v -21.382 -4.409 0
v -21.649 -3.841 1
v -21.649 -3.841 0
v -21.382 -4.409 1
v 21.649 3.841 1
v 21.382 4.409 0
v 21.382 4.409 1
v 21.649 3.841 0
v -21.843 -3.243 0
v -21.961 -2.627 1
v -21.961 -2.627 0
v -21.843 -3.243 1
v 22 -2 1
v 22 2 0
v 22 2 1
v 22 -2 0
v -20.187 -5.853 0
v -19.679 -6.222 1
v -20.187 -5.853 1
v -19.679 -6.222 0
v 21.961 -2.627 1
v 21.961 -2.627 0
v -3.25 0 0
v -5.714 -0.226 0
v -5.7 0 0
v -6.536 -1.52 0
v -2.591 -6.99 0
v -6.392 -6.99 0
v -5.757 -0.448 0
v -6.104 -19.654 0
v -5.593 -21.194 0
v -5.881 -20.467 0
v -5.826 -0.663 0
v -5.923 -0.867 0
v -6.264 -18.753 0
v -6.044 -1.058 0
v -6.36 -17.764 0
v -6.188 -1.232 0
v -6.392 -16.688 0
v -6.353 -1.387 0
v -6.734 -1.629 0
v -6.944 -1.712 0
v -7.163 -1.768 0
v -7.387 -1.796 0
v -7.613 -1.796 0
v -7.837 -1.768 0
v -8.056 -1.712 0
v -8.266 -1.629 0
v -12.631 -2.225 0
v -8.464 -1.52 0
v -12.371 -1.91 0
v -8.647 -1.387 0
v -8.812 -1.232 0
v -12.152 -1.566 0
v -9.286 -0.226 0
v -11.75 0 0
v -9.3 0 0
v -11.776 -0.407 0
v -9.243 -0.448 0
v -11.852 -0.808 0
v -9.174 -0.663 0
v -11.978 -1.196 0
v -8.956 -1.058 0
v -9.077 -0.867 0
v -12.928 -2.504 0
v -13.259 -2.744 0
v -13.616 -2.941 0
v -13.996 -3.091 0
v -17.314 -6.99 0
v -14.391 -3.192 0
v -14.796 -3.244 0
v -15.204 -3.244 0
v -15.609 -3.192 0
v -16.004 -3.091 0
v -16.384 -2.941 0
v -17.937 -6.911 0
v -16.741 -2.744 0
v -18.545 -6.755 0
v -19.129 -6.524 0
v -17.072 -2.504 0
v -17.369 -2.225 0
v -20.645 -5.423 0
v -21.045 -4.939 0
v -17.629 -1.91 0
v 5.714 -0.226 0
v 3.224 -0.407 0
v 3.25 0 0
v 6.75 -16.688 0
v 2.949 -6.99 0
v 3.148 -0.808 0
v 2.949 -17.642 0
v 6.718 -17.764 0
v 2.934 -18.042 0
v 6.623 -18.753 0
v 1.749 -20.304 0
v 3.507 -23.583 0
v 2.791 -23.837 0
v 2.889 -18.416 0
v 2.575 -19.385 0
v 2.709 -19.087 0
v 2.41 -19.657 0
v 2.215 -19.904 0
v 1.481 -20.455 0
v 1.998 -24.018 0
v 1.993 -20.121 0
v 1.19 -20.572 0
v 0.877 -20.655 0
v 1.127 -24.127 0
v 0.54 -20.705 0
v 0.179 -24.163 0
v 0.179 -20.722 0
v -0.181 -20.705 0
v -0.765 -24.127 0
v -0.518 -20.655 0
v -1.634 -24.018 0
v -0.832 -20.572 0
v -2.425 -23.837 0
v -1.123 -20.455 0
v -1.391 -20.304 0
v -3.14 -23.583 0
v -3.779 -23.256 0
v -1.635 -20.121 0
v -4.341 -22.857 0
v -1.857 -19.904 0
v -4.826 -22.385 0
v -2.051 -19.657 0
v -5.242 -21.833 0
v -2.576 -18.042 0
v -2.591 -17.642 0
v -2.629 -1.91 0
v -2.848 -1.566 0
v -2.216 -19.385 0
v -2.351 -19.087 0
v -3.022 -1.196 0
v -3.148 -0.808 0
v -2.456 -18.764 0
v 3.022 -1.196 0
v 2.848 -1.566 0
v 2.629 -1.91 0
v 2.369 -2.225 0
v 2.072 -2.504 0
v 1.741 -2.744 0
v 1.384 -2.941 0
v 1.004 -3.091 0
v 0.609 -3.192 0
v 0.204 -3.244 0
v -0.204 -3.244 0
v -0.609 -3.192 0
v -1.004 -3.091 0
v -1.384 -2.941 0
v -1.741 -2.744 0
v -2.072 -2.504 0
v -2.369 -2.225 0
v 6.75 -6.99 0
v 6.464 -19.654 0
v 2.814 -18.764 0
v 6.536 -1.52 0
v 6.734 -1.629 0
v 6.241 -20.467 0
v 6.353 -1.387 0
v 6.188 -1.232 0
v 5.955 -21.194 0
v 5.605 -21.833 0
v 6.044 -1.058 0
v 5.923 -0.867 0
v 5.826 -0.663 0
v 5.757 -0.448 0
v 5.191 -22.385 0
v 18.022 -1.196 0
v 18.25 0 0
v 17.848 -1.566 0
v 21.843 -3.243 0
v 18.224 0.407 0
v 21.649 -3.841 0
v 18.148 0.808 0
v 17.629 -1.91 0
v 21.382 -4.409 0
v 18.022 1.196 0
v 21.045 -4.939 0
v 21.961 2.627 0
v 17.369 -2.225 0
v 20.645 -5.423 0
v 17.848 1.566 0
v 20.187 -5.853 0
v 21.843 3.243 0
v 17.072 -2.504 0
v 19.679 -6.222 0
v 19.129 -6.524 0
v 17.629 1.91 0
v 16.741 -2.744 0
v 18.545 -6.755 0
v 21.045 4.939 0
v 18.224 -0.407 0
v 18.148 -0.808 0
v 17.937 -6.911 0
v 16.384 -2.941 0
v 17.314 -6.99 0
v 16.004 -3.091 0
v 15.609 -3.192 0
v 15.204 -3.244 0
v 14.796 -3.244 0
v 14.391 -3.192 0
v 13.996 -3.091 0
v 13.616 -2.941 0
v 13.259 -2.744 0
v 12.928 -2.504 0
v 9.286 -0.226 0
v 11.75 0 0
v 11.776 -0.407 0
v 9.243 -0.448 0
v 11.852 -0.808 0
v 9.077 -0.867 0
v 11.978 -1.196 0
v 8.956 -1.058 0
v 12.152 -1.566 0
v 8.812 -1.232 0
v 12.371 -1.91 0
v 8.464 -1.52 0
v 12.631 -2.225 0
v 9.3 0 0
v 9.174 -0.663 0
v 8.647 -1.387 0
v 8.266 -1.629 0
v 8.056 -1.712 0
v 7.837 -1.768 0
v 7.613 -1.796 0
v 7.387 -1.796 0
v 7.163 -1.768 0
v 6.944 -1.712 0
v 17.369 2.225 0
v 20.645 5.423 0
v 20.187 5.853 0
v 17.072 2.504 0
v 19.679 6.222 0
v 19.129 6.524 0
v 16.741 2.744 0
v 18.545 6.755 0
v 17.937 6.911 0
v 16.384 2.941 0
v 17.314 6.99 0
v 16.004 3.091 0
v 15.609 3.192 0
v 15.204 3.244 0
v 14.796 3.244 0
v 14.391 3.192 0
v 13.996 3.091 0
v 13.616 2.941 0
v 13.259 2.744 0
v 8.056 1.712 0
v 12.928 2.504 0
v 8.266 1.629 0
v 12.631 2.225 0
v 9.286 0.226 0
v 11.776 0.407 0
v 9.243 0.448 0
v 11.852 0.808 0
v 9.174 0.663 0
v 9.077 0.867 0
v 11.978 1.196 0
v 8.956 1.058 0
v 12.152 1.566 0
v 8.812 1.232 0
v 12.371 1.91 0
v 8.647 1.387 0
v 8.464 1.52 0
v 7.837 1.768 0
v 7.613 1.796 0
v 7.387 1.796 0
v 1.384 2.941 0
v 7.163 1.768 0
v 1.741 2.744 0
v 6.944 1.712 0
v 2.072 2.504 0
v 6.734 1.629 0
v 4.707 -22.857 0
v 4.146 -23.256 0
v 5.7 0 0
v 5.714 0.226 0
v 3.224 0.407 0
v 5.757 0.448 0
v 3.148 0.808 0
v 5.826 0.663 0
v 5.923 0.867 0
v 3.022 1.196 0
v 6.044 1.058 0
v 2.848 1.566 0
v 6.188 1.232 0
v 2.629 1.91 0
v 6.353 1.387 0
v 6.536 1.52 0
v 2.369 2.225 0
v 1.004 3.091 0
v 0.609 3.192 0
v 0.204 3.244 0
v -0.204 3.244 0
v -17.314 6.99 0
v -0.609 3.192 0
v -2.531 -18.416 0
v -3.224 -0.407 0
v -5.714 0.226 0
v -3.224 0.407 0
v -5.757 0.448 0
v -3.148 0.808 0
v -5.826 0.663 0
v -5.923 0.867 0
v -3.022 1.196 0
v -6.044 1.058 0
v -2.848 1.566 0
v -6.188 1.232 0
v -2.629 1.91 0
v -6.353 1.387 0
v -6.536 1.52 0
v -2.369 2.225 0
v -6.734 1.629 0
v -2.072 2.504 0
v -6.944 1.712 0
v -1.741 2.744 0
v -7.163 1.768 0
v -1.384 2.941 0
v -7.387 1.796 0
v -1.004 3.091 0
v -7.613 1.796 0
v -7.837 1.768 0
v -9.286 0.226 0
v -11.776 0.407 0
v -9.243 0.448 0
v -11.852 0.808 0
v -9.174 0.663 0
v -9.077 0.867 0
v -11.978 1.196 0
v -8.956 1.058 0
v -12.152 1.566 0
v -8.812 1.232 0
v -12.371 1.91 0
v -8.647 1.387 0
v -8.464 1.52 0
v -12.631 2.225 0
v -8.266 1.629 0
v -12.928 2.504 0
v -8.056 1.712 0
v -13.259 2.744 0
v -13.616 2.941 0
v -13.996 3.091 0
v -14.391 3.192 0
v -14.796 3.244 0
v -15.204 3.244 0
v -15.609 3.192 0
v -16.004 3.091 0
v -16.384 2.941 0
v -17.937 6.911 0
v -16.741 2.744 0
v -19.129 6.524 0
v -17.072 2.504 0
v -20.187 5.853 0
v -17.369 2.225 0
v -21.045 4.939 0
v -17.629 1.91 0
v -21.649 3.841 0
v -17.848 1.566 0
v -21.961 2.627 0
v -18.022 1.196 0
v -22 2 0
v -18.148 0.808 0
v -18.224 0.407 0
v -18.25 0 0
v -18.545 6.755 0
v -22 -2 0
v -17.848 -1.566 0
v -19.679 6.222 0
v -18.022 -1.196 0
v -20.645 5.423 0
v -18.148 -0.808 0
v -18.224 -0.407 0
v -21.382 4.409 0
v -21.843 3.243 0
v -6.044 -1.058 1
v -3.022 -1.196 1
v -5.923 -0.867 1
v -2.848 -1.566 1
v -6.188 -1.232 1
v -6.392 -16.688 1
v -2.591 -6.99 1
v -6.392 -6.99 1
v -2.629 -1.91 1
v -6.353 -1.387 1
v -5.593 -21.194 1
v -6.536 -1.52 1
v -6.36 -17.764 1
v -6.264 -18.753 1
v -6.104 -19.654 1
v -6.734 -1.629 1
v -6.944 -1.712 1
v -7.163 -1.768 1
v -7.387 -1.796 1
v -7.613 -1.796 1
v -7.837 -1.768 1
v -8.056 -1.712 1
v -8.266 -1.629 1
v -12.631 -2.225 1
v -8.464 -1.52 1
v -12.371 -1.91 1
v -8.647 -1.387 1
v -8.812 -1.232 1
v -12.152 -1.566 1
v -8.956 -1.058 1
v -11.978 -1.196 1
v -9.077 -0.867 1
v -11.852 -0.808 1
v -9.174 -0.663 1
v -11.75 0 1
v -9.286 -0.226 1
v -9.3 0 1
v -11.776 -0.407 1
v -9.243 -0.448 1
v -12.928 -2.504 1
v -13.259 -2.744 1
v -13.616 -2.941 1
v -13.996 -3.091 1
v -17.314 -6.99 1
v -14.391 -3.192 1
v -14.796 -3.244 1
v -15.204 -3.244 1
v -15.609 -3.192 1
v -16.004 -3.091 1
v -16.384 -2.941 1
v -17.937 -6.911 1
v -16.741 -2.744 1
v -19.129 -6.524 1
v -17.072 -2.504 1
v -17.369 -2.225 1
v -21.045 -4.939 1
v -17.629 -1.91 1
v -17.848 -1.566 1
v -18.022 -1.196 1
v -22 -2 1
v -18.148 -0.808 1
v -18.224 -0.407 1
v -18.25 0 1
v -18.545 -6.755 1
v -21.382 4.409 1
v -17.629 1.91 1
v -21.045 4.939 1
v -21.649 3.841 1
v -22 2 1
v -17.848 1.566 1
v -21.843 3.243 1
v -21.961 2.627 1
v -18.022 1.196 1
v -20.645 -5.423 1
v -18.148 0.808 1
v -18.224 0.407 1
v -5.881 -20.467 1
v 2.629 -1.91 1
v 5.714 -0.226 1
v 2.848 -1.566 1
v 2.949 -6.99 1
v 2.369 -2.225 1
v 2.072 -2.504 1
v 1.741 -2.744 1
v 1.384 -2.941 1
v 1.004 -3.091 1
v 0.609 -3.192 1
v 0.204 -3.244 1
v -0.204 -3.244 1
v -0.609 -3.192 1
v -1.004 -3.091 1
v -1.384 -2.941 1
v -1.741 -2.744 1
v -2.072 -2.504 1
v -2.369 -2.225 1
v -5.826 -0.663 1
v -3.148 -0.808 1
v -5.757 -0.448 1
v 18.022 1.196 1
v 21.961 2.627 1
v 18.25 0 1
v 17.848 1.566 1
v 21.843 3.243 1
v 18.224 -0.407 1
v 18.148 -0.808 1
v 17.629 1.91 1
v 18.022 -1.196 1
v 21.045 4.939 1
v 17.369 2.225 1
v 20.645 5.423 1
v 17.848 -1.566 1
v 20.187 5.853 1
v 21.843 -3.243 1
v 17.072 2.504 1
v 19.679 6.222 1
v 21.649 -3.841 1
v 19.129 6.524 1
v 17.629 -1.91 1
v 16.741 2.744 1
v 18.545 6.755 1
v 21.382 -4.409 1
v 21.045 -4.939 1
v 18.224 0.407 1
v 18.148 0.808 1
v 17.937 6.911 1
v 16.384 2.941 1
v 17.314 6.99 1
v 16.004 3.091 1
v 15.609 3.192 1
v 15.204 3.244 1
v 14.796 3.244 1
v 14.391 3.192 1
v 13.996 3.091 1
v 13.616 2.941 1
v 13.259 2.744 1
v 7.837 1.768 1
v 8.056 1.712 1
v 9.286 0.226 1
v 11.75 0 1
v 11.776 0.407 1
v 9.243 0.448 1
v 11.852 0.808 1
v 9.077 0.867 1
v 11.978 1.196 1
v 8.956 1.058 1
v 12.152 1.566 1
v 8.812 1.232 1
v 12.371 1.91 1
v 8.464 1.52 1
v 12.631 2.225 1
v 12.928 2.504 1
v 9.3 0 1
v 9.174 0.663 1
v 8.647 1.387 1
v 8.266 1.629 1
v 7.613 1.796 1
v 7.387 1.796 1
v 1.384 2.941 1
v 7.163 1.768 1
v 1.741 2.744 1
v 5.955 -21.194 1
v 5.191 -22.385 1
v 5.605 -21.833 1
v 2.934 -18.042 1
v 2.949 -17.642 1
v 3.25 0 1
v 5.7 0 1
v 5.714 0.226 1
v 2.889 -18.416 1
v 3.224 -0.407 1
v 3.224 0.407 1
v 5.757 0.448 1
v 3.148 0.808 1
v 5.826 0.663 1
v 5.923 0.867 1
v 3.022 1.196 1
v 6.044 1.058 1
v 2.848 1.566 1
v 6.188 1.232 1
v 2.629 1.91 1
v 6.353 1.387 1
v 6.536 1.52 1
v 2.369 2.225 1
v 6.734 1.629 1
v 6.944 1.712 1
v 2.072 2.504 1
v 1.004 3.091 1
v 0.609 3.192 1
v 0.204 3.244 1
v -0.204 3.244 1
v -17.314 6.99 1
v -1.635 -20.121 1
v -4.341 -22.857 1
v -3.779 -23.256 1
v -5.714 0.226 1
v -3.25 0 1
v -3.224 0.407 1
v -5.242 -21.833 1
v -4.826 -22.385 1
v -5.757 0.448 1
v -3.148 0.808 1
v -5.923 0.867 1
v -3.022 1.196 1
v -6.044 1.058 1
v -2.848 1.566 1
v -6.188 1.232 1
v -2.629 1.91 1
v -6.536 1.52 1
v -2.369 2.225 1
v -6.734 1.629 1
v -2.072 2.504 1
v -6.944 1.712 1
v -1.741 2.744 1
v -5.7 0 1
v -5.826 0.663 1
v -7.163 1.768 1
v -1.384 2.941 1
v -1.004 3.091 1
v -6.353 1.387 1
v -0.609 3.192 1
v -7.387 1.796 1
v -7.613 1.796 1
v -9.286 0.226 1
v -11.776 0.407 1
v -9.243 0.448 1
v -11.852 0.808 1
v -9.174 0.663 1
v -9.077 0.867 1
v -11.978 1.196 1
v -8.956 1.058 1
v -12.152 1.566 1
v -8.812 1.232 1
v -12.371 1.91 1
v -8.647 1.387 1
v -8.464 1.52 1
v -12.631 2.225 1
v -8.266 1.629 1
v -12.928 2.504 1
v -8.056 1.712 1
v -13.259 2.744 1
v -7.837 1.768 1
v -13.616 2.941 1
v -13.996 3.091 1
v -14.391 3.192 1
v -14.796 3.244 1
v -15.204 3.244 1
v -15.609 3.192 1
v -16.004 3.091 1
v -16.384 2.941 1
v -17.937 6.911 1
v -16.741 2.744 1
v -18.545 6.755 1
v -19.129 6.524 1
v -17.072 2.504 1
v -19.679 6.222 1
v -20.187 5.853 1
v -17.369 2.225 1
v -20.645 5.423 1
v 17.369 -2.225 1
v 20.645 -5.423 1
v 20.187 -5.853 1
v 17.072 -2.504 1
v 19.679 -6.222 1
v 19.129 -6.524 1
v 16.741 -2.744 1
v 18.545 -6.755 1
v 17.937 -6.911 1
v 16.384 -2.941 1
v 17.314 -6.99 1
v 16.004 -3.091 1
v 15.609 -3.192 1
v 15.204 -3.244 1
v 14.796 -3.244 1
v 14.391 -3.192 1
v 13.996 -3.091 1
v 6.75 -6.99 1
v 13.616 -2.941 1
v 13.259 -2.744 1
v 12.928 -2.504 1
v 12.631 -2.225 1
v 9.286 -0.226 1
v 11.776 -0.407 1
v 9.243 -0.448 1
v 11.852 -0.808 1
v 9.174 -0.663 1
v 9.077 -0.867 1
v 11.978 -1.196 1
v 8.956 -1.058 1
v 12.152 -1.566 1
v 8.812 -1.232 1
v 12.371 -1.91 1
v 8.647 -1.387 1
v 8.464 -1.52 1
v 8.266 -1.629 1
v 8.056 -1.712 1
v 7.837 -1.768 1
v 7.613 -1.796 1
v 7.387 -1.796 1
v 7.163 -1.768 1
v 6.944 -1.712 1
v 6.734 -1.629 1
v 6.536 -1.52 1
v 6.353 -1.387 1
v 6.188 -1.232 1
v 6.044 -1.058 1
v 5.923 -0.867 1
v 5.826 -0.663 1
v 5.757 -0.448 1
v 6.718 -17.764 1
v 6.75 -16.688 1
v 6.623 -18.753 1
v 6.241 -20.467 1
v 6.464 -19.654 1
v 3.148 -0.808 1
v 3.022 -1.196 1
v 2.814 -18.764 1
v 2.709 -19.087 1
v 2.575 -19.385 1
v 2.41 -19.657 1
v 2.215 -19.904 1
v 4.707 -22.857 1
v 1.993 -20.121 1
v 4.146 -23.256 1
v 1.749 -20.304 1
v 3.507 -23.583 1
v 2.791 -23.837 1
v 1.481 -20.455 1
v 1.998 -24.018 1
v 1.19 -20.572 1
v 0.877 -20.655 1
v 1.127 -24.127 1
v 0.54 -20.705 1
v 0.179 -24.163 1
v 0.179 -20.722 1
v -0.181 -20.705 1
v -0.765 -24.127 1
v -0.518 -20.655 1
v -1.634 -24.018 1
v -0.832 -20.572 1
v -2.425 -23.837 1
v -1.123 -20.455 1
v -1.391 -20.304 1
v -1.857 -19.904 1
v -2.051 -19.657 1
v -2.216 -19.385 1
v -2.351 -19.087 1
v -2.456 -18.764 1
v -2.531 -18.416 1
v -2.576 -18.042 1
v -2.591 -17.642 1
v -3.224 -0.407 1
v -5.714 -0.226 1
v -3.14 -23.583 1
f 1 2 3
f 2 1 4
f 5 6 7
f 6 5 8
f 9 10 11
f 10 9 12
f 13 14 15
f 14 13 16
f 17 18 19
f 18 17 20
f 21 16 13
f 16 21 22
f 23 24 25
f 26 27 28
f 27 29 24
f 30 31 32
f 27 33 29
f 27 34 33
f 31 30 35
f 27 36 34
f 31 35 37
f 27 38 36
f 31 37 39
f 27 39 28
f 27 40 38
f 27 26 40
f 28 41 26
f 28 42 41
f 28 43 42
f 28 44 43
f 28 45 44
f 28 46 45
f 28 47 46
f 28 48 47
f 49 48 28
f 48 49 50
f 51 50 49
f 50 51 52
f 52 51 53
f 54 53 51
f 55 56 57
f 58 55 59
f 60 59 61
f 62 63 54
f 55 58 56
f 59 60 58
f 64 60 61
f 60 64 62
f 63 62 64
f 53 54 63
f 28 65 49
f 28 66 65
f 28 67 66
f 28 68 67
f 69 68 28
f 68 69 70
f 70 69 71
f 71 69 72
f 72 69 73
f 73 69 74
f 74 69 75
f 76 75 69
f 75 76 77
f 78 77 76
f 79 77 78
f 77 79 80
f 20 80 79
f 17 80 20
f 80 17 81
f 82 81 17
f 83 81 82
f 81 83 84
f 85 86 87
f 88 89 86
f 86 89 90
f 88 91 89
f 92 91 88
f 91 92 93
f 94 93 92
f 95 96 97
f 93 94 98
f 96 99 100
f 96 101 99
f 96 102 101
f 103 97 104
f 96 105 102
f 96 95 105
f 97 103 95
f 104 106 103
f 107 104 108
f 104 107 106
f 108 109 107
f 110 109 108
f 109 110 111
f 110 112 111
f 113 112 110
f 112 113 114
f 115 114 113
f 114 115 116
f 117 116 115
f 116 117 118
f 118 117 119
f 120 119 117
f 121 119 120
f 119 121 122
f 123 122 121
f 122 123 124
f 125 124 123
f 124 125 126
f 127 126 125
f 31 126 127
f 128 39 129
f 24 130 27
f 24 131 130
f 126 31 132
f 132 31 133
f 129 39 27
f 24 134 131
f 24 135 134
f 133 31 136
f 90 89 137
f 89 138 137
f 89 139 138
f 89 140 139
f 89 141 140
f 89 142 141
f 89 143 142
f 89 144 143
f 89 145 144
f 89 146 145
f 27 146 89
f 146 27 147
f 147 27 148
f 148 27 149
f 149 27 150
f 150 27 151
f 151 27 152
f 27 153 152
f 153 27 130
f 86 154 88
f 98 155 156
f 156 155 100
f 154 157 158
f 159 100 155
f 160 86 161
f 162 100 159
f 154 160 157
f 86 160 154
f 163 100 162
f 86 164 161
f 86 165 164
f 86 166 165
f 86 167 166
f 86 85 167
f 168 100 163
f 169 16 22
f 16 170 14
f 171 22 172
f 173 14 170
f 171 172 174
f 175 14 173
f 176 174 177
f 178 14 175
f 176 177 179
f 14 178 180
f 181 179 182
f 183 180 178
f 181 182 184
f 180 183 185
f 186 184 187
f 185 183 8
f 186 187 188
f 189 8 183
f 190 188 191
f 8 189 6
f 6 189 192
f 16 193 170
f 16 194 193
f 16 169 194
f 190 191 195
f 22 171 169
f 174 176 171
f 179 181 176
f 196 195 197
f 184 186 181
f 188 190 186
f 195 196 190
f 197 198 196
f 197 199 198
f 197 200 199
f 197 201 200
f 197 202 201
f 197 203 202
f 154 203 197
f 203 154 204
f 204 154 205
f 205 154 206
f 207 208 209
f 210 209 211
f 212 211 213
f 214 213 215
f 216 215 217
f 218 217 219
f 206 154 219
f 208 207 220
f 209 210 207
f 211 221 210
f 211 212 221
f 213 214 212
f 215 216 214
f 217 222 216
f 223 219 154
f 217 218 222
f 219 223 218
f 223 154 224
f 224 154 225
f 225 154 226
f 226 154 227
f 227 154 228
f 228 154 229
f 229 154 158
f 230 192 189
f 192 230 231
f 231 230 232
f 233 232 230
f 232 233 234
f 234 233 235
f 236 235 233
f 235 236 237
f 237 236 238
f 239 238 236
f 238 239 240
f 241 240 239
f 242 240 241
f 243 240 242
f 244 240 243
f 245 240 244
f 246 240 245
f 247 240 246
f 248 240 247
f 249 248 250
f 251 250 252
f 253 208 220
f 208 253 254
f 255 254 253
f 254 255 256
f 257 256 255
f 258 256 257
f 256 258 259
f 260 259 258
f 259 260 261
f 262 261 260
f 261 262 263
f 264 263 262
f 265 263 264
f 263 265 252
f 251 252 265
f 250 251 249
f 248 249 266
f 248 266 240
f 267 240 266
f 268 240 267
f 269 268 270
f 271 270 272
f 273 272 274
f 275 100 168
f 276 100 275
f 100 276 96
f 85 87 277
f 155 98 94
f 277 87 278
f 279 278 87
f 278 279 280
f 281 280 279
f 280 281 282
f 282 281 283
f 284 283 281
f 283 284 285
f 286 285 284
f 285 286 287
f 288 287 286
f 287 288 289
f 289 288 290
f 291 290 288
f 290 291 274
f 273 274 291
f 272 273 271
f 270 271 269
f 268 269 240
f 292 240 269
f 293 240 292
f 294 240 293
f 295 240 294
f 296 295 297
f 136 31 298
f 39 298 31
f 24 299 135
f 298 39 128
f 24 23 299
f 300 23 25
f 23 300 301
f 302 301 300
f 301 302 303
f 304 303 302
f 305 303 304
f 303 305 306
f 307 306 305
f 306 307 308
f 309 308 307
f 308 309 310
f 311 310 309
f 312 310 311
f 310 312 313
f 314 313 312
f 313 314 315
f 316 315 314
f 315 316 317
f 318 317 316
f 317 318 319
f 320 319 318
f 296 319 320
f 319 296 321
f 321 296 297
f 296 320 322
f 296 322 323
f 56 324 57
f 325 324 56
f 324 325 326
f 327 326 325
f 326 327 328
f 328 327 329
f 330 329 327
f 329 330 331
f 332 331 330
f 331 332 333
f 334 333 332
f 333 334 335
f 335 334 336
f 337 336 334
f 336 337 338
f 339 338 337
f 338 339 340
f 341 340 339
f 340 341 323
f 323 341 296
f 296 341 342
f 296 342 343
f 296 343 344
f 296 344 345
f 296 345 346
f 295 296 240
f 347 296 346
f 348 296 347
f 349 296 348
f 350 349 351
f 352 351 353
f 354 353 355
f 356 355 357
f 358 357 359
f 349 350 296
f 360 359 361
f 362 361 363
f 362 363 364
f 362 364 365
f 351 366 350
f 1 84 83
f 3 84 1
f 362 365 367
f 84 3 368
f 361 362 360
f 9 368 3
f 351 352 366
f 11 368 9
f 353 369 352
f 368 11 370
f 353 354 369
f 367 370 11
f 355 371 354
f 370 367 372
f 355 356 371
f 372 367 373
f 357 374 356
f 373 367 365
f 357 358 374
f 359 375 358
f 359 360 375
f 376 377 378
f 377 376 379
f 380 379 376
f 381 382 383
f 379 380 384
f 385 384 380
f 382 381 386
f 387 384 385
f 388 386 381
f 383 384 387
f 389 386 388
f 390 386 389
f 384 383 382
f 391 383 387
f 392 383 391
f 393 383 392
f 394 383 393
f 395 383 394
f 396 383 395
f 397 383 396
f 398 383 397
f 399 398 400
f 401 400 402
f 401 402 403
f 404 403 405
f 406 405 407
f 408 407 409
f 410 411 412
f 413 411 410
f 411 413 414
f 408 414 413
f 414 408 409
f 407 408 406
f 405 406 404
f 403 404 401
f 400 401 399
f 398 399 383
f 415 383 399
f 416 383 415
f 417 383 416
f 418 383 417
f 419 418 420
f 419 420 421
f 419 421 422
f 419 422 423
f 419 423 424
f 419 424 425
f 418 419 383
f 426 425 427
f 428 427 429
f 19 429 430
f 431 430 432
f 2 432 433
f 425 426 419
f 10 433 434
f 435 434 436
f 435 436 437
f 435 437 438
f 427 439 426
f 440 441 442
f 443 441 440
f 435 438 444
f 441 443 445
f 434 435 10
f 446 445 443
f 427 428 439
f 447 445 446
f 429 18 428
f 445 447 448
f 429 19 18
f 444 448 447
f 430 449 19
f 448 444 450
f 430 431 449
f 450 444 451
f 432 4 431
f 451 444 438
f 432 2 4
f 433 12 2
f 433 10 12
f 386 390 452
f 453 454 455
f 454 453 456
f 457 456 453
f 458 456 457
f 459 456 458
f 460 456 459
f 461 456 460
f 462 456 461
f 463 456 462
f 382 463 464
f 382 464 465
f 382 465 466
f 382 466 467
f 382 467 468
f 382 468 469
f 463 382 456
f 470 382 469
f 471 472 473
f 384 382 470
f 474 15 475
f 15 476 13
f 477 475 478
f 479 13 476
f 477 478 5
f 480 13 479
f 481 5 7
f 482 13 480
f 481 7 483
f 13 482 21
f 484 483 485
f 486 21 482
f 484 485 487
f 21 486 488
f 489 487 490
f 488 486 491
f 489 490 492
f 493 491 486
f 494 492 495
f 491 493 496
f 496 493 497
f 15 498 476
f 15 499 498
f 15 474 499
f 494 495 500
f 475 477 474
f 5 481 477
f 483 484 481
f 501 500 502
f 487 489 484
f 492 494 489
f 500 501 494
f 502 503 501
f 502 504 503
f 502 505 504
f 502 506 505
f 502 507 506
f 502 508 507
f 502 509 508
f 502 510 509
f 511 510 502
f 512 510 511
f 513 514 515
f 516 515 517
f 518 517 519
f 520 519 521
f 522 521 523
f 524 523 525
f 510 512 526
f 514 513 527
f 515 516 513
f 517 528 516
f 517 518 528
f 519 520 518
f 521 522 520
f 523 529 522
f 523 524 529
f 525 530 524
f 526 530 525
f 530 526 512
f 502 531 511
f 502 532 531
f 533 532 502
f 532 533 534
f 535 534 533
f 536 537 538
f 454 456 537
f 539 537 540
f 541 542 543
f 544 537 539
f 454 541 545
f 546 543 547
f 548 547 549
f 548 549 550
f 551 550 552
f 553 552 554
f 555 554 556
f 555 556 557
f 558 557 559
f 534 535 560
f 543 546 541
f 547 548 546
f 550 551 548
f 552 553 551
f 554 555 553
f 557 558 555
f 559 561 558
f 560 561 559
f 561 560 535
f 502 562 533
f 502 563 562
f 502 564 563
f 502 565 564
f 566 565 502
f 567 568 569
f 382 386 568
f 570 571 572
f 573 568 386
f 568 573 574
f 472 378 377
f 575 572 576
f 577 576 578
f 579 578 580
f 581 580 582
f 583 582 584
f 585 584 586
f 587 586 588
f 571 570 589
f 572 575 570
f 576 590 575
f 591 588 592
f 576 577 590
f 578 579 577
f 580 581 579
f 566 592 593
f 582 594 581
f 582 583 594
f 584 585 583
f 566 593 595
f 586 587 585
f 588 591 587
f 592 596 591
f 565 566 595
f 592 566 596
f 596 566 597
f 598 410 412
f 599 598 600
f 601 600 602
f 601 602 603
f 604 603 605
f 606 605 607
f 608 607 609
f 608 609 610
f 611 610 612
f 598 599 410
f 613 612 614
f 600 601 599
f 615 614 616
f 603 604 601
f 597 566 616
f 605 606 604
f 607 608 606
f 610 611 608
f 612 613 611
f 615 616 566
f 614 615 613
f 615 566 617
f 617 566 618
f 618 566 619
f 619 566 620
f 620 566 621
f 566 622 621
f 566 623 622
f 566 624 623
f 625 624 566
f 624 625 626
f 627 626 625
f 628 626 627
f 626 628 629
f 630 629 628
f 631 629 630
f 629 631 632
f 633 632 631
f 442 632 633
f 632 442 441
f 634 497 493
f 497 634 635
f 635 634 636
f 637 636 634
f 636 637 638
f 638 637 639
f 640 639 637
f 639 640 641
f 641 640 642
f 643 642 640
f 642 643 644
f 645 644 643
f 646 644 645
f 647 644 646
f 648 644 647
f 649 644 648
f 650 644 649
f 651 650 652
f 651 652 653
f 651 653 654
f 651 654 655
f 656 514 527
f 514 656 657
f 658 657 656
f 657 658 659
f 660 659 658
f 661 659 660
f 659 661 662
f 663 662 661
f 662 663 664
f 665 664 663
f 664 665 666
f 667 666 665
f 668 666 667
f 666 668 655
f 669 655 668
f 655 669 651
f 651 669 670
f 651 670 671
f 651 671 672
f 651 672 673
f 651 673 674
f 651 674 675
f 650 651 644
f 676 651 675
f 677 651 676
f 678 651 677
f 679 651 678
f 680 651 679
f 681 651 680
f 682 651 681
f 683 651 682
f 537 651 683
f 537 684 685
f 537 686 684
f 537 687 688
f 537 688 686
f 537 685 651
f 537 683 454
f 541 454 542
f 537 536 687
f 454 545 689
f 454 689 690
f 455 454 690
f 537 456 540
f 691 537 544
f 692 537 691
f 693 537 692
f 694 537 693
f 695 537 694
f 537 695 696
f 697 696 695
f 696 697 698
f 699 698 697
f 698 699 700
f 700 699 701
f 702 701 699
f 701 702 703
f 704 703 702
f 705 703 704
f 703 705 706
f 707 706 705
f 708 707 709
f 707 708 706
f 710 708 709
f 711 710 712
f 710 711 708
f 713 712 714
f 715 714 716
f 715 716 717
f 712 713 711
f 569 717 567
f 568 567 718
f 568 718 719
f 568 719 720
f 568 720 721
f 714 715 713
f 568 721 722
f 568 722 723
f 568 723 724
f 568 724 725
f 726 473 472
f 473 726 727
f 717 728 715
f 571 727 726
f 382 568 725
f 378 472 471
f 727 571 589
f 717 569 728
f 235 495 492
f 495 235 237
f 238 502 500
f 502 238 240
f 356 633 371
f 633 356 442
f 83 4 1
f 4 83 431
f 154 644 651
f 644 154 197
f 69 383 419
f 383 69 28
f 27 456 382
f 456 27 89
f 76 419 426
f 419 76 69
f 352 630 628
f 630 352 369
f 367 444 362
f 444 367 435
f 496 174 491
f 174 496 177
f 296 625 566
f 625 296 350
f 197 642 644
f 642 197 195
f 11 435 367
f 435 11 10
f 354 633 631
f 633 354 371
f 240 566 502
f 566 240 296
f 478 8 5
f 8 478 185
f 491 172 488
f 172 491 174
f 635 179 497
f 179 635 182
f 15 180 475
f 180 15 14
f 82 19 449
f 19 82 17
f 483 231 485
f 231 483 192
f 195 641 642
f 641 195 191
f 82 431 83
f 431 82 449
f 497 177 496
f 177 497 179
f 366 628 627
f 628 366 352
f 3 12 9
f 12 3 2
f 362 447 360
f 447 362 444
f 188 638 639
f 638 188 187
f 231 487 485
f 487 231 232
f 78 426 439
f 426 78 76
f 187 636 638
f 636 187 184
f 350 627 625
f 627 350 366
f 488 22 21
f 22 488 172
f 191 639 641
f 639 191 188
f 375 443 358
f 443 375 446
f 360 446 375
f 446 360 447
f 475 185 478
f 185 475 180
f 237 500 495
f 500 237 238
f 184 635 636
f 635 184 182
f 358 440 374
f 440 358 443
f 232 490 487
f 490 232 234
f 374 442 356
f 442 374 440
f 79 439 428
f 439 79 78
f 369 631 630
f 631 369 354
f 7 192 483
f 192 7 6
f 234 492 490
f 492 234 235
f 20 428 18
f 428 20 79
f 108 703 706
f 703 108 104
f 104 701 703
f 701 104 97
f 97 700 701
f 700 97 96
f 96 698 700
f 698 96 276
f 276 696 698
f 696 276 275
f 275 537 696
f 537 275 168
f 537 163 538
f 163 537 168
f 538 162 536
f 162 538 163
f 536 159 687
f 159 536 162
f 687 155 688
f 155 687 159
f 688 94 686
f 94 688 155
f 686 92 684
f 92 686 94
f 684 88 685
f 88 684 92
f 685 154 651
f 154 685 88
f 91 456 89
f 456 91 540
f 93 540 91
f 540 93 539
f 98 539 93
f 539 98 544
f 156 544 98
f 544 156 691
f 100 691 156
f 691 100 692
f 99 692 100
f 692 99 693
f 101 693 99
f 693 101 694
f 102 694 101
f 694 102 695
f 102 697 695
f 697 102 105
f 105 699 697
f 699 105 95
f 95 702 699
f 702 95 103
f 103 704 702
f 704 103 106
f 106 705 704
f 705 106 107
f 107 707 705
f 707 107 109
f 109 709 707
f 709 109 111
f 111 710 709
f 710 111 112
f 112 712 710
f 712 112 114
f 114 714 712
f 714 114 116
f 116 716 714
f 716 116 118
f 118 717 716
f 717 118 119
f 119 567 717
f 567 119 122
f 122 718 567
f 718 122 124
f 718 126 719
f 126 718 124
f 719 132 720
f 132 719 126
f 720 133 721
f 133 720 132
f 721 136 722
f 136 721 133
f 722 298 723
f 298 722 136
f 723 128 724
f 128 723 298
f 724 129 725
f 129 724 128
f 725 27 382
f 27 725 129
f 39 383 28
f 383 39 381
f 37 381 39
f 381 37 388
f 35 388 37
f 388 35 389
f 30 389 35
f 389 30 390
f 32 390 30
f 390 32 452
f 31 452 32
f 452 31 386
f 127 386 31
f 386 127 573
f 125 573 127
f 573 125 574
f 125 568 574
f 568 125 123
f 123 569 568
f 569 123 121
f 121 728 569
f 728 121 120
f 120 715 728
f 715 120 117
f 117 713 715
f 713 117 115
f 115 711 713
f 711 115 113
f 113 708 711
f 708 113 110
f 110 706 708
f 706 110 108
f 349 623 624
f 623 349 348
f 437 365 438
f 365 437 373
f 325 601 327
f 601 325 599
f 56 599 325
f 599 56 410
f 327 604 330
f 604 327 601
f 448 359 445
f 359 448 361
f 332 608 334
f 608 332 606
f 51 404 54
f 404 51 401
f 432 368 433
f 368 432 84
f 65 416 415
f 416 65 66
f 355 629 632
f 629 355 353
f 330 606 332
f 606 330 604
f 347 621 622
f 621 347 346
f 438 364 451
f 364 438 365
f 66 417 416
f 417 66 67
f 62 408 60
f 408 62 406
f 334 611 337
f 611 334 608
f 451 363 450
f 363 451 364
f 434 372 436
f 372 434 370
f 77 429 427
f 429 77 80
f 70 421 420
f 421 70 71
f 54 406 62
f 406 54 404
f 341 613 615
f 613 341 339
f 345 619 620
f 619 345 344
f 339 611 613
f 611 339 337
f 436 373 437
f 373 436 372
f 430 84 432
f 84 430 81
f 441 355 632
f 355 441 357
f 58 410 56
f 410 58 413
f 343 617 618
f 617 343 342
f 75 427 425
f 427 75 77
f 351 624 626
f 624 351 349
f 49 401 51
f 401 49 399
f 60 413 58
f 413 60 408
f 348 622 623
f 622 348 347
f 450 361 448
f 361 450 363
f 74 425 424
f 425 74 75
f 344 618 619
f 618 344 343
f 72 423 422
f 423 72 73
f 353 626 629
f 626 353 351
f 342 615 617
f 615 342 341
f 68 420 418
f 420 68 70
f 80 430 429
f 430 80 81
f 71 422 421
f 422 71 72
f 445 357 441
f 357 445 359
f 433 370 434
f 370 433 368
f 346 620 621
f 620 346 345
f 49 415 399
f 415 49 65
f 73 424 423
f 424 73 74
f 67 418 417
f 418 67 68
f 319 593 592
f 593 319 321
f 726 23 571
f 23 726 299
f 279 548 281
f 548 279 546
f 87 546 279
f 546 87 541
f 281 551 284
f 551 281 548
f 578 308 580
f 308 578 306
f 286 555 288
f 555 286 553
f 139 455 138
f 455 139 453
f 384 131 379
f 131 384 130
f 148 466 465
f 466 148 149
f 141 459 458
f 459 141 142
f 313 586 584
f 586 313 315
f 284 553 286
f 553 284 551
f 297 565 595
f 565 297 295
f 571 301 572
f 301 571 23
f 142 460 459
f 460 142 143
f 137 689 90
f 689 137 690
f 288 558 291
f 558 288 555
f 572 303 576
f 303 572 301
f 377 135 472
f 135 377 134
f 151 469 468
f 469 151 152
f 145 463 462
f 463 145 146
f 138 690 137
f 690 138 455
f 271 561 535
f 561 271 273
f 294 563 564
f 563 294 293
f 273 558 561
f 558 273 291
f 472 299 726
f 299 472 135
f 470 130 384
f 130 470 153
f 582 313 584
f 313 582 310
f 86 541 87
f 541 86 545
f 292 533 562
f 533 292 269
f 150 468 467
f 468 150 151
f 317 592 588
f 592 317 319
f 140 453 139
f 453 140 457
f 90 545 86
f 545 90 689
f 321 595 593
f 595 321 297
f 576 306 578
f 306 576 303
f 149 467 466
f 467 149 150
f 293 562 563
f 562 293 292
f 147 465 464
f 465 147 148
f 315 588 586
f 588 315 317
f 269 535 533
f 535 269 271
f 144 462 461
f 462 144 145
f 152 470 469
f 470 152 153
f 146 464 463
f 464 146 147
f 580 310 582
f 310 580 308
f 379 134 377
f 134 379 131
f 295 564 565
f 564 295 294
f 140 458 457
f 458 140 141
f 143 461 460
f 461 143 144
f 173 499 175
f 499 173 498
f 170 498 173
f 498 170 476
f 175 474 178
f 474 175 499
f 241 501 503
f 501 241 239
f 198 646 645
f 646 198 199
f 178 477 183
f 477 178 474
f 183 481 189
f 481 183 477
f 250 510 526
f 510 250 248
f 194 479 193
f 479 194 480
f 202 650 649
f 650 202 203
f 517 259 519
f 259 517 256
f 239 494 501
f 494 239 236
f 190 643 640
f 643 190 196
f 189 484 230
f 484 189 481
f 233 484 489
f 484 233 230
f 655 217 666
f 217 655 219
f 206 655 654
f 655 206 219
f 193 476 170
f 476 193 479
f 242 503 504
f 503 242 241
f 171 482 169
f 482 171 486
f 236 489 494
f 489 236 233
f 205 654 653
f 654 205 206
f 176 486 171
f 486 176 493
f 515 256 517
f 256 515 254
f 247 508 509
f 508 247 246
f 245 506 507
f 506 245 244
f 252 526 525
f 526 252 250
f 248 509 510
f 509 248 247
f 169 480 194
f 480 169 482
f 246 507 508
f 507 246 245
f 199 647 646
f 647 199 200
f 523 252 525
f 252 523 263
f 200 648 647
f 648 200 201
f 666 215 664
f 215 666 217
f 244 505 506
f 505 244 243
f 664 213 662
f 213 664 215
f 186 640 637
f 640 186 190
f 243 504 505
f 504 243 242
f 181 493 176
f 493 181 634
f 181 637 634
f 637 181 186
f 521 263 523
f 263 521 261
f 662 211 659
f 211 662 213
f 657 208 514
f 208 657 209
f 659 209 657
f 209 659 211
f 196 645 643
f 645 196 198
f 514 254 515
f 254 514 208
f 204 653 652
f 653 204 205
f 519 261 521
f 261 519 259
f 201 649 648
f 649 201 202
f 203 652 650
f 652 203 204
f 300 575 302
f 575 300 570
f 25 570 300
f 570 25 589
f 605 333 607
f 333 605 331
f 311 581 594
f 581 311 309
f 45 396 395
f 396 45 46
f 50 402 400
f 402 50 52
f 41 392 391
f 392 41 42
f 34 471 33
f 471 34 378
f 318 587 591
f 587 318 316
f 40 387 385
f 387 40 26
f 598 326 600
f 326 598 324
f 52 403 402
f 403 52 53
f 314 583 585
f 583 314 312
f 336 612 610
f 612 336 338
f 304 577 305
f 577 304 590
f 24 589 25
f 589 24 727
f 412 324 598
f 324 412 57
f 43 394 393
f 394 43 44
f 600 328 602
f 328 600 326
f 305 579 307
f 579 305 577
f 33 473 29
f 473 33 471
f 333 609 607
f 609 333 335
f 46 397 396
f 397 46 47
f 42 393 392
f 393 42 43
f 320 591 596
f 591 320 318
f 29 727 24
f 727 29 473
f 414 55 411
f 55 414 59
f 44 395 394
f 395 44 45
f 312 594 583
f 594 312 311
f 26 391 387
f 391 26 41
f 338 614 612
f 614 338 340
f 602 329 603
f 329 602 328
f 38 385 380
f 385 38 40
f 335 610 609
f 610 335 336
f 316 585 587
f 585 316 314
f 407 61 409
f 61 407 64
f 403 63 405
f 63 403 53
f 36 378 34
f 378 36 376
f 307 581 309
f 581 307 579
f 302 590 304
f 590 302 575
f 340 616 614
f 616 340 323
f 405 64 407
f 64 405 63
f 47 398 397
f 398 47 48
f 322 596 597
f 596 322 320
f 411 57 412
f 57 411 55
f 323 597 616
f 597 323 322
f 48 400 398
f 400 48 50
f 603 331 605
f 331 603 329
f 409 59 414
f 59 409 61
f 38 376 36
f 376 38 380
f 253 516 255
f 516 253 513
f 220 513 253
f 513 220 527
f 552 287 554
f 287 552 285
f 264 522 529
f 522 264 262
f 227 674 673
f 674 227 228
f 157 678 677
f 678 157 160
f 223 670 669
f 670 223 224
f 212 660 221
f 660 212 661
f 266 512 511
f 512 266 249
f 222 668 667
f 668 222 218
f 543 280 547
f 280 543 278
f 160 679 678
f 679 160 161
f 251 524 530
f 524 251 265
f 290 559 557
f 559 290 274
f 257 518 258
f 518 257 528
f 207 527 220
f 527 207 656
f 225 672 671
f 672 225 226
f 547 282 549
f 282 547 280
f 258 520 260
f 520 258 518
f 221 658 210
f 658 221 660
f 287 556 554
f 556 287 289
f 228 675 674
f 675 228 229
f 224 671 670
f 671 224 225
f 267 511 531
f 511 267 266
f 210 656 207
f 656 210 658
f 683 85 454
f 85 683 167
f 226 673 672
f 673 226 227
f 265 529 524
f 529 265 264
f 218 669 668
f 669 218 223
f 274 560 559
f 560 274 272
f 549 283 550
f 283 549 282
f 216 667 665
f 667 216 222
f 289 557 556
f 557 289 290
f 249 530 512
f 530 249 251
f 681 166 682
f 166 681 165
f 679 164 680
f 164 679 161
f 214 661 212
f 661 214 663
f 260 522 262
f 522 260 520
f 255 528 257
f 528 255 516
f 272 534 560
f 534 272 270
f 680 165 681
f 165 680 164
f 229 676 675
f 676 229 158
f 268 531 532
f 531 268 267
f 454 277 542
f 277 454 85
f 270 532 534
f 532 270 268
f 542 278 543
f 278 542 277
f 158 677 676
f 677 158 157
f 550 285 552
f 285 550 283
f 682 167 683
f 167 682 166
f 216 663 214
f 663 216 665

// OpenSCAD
$fn = 50;


difference() {
	union() {
		hull() {
			translate(v = [-17.0000000000, 2.0000000000, 0]) {
				cylinder(h = 1, r = 5);
			}
			translate(v = [17.0000000000, 2.0000000000, 0]) {
				cylinder(h = 1, r = 5);
			}
			translate(v = [-17.0000000000, -2.0000000000, 0]) {
				cylinder(h = 1, r = 5);
			}
			translate(v = [17.0000000000, -2.0000000000, 0]) {
				cylinder(h = 1, r = 5);
			}
		}
		translate(v = [0, -5, 0]) {
			linear_extrude(height = 1) {
				text(font = "DejaVu Sans Mono:style=Bold", halign = "center", size = 19.0000000000, text = "U", valign = "top");
			}
		}
	}
	union() {
		translate(v = [-15.0000000000, 0.0000000000, 0]) {
			translate(v = [0, 0, -100]) {
				cylinder(h = 200, r = 3.2500000000);
			}
		}
		translate(v = [0, 0, -100]) {
			cylinder(h = 200, r = 3.2500000000);
		}
		translate(v = [15.0000000000, 0.0000000000, 0]) {
			translate(v = [0, 0, -100]) {
				cylinder(h = 200, r = 3.2500000000);
			}
		}
		translate(v = [-15.0000000000, 0.0000000000, 0]) {
			translate(v = [0, 0, -100]) {
				cylinder(h = 200, r = 1.8000000000);
			}
		}
		translate(v = [-7.5000000000, 0.0000000000, 0]) {
			translate(v = [0, 0, -100]) {
				cylinder(h = 200, r = 1.8000000000);
			}
		}
		translate(v = [0, 0, -100]) {
			cylinder(h = 200, r = 1.8000000000);
		}
		translate(v = [7.5000000000, 0.0000000000, 0]) {
			translate(v = [0, 0, -100]) {
				cylinder(h = 200, r = 1.8000000000);
			}
		}
		translate(v = [15.0000000000, 0.0000000000, 0]) {
			translate(v = [0, 0, -100]) {
				cylinder(h = 200, r = 1.8000000000);
			}
		}
	}
}
